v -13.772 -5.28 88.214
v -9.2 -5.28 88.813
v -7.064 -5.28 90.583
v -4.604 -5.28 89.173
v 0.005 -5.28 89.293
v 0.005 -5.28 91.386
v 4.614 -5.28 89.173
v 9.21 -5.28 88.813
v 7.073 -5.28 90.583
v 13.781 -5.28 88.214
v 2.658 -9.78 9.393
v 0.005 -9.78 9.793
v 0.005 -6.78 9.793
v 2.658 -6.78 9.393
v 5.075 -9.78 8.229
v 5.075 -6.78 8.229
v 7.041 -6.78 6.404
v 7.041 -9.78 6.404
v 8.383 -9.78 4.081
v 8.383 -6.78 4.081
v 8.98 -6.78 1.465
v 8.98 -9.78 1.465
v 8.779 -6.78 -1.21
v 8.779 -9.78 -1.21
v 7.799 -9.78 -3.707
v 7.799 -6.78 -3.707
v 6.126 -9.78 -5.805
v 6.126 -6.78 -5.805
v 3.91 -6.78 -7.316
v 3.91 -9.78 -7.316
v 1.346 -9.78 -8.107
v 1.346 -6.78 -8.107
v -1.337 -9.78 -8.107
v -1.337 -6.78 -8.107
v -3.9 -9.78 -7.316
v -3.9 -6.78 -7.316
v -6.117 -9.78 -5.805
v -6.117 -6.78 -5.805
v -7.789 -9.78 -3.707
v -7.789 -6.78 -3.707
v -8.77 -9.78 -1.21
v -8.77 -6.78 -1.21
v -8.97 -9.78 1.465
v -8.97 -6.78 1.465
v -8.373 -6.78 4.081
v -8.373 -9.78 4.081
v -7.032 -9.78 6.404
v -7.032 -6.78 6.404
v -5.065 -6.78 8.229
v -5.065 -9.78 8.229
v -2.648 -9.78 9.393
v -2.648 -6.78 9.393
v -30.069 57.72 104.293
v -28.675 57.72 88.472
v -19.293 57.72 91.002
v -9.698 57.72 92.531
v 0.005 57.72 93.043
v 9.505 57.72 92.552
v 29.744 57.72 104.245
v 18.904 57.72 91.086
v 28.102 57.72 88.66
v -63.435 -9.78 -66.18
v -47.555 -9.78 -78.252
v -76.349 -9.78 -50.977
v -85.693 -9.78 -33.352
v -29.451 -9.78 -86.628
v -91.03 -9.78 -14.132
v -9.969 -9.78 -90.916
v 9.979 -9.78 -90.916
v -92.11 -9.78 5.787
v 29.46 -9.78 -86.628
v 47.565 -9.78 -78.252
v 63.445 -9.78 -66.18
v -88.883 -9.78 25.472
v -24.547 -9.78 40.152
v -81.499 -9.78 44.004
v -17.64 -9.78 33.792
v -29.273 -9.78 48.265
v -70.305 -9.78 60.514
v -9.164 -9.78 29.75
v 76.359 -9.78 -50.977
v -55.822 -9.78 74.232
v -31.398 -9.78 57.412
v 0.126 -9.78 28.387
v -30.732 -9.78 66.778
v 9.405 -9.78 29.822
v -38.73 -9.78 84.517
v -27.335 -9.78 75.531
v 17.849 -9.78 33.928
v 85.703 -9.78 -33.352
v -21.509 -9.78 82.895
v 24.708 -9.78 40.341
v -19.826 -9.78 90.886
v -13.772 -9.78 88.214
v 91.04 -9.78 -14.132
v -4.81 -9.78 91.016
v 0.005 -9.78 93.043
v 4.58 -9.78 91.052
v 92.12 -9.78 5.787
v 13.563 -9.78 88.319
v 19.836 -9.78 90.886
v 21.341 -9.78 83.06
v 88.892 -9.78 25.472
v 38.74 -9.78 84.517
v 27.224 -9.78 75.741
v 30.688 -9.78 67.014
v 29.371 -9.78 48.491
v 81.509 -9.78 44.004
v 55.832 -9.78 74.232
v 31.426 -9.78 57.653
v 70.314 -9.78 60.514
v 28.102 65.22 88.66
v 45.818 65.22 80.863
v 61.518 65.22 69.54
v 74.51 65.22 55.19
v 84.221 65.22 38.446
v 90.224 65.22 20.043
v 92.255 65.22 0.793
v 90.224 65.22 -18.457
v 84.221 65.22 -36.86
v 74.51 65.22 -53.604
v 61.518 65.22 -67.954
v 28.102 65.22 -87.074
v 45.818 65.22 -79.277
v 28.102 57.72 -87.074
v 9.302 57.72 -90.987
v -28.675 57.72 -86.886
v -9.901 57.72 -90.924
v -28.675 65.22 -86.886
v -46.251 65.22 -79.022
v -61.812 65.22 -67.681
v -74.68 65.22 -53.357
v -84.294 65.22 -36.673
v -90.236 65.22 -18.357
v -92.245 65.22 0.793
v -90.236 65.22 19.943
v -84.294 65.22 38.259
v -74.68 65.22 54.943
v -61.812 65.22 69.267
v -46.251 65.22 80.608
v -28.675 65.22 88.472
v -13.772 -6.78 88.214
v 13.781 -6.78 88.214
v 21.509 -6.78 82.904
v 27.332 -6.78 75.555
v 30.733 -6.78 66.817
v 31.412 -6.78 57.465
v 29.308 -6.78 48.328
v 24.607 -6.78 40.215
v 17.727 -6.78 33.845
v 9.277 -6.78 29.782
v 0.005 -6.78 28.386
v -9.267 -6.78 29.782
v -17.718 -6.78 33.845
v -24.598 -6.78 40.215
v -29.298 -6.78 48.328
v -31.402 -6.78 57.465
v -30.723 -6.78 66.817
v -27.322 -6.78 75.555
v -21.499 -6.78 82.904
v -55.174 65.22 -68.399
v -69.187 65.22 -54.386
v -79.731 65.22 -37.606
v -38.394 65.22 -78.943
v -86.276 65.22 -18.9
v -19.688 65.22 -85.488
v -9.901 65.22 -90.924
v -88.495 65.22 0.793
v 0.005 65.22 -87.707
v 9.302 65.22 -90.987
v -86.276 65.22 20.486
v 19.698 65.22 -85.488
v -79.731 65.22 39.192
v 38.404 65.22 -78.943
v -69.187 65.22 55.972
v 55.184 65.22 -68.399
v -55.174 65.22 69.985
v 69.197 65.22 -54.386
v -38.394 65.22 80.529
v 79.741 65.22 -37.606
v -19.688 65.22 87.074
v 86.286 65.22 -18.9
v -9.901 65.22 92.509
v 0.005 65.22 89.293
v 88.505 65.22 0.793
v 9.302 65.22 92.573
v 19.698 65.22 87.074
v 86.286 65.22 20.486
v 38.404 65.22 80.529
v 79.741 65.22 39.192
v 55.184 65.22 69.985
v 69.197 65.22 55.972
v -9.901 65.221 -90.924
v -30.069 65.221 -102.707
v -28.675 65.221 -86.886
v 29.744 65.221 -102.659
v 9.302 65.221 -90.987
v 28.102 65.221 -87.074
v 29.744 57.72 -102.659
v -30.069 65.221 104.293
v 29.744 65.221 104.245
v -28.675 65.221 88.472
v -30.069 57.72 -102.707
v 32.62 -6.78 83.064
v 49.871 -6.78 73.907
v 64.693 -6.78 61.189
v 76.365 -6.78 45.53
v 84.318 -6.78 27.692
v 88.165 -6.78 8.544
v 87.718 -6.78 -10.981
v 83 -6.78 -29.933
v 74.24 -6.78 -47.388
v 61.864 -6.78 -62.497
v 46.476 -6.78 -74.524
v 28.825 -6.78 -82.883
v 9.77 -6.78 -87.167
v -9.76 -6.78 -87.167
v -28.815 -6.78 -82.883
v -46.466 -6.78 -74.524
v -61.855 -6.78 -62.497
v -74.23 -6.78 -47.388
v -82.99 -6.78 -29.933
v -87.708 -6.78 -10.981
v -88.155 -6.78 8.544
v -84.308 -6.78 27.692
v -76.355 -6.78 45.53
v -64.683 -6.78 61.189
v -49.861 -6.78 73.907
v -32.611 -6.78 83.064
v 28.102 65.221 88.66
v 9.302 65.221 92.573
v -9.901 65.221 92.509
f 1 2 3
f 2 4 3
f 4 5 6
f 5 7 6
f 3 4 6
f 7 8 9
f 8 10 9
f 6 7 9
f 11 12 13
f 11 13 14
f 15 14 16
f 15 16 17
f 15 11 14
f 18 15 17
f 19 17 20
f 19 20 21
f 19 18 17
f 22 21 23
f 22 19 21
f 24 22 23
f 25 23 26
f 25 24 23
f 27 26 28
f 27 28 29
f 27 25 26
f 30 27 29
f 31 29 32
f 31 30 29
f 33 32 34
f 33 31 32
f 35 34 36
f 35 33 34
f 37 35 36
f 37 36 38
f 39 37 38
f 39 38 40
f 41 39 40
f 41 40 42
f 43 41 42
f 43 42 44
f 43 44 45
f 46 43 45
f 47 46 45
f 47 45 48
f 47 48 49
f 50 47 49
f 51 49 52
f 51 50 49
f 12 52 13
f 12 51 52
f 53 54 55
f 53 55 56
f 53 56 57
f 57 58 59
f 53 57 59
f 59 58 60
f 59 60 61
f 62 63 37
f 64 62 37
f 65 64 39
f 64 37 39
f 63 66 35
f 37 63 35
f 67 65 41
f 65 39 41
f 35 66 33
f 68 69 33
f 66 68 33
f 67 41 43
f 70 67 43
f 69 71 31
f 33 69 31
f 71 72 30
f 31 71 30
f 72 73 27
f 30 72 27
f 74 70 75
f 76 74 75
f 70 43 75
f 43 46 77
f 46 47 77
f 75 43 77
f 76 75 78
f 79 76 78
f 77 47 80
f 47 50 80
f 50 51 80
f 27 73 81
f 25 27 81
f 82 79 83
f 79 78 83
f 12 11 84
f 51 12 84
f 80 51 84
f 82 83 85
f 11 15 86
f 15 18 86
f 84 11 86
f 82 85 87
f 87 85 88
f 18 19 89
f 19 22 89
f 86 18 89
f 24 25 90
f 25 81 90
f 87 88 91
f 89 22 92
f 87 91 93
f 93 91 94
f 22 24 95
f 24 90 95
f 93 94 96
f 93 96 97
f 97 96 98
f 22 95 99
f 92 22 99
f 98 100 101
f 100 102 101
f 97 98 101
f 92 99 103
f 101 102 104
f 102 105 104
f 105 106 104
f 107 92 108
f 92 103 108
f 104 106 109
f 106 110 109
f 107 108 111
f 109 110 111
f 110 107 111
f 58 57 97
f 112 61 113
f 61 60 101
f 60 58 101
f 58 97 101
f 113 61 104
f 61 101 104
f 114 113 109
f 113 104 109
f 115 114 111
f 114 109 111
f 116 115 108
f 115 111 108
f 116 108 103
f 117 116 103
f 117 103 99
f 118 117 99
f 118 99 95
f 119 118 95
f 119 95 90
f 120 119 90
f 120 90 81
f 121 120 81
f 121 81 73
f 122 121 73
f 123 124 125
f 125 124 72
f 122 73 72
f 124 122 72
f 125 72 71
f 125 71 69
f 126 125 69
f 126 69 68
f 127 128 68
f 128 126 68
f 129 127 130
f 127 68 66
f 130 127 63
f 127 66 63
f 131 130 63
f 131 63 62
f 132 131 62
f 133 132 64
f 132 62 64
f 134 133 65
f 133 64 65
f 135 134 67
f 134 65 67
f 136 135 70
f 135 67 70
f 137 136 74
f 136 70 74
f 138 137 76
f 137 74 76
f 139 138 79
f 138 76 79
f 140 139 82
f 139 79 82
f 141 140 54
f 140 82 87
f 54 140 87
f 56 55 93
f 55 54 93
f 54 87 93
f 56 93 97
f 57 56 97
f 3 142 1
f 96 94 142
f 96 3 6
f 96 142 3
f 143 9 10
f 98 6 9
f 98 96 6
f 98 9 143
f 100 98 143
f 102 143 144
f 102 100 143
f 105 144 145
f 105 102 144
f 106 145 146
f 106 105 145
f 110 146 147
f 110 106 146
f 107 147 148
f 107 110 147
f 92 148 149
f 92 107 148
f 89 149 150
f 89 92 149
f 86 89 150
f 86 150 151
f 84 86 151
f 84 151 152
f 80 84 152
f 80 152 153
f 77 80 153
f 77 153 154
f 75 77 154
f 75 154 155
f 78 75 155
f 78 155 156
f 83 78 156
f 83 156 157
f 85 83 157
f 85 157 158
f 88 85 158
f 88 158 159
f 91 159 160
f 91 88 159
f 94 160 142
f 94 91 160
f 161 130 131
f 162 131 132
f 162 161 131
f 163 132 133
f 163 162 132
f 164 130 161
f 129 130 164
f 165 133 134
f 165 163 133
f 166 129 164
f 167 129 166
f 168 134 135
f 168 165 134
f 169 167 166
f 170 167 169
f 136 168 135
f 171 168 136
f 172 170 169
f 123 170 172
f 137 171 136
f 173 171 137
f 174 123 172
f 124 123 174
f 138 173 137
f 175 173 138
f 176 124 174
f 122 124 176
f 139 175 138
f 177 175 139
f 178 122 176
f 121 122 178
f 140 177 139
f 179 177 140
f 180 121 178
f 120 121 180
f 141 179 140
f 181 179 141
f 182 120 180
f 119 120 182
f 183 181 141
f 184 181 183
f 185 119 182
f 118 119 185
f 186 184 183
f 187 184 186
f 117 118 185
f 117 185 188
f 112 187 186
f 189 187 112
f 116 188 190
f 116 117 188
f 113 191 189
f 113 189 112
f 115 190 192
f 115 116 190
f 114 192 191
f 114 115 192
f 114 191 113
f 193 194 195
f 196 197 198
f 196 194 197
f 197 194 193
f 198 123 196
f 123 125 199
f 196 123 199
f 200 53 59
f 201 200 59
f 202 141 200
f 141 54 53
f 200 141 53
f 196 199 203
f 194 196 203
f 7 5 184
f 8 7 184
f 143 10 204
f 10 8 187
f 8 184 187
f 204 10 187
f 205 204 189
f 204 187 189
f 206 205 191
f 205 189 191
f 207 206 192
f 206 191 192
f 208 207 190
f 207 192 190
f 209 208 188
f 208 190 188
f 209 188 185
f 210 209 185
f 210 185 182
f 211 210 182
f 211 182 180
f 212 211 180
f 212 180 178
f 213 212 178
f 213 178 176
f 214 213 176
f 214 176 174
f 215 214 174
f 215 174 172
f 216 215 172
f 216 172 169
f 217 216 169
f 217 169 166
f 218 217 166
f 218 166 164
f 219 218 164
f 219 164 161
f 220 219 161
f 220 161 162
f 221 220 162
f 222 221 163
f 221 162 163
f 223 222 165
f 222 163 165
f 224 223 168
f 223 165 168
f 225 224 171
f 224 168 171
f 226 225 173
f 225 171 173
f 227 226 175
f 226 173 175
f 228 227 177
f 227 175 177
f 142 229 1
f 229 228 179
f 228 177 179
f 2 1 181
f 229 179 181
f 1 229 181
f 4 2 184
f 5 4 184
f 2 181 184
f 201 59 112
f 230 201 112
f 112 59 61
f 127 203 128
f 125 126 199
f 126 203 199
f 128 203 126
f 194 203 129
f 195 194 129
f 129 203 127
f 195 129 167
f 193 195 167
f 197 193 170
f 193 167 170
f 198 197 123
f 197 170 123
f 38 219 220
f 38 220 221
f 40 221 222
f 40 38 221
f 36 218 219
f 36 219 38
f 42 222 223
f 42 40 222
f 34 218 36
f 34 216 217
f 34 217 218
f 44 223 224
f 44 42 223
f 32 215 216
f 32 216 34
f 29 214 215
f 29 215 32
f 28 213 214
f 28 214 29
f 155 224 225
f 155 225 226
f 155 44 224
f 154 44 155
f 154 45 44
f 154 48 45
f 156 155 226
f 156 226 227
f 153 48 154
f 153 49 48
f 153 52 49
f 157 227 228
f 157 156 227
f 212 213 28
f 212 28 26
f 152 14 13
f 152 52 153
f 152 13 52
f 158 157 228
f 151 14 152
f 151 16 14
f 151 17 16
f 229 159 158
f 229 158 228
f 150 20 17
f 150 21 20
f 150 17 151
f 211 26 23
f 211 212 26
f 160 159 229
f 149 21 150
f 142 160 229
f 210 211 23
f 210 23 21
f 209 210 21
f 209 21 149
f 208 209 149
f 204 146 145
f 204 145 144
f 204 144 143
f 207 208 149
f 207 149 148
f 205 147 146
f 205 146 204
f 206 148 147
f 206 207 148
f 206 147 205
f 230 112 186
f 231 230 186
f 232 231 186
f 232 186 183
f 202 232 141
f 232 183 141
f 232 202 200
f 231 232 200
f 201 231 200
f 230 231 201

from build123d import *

# Parameters (mm, degrees)
SKETCH2_R           = 61.5
BOSS_EXTRUDE1_DEPTH = 50
SKETCH6_R           = 59
CUT_EXTRUDE1_DEPTH  = 48
SKETCH7_R           = 6
CUT_EXTRUDE4_DEPTH  = 2
SKETCH9_R           = 21
CUT_EXTRUDE5_DEPTH  = 3
BOSS_EXTRUDE2_START = -5
BOSS_EXTRUDE2_DEPTH = 5.0001
SCALE2_SCALE        = 1.5


# Read off the part's stored shape, not the designer's step: Boss-Extrude2
with BuildPart() as part:
    # Sketch2 → Boss-Extrude1 (new body)
    with BuildSketch(Plane(origin=(0, 0, 0), x_dir=(1, 0, 0), z_dir=(0, 1, 0))):
        with Locations(Location((0, 0, 0), (0, 0, 270))):
            Circle(SKETCH2_R)
    extrude(amount=BOSS_EXTRUDE1_DEPTH)

    # Sketch6 → Cut-Extrude1 (cut)
    with BuildSketch(Plane(origin=(0, 50, 0), x_dir=(1, 0, 0), z_dir=(0, 1, 0))):
        with Locations(Location((0, 0, 0), (0, 0, 270))):
            Circle(SKETCH6_R)
    extrude(amount=-CUT_EXTRUDE1_DEPTH, mode=Mode.SUBTRACT)

    # Sketch7 → Cut-Extrude4 (cut)
    with BuildSketch(Plane(origin=(0, 0, 0), x_dir=(1, 0, 0), z_dir=(0, 1, 0))):
        with Locations(Location((0, 0, 0), (0, 0, 270))):
            Circle(SKETCH7_R)
    extrude(amount=CUT_EXTRUDE4_DEPTH, mode=Mode.SUBTRACT)

    # Sketch9 → Cut-Extrude5 (cut)
    with BuildSketch(Plane(origin=(0, 0, 0), x_dir=(1, 0, 0), z_dir=(0, 1, 0))):
        with Locations(Location((0, -39.395608547, 0), (0, 0, 244.065435775))):
            Circle(SKETCH9_R)
    extrude(amount=CUT_EXTRUDE5_DEPTH, mode=Mode.SUBTRACT)

    # Boss-Extrude2 outline → Boss-Extrude2 (add)
    with BuildSketch(Plane(origin=(0, 50, 0), x_dir=(1, 0, 0), z_dir=(0, 1, 0)).offset(BOSS_EXTRUDE2_START)):
        with BuildLine():
            ThreePointArc((18.731112888, -58.578113745), (-0.20418242, -61.499661052), (-19.119661096, -58.452446994))
            Line((-19.119661096, -58.452446994), (-20.049464932, -68.999980107))
            Line((-20.049464932, -68.999980107), (19.825959412, -68.968020016))
            Line((19.825959412, -68.968020016), (18.731112888, -58.578113745))
        make_face()
        with BuildLine():
            Line((-20.049464932, 68.999980107), (-19.119661096, 58.452446994))
            ThreePointArc((-19.119661096, 58.452446994), (-0.20418242, 61.499661052), (18.731112888, 58.578113745))
            Line((18.731112888, 58.578113745), (19.825959412, 68.968020016))
            Line((19.825959412, 68.968020016), (-20.049464932, 68.999980107))
        make_face()
    extrude(amount=BOSS_EXTRUDE2_DEPTH)


with BuildPart() as part_1:
    # Scale2: scaled about (-0.009677872, 19.559028085, -1.585736767)
    add(part.part.scale(SCALE2_SCALE).moved(Location((0.004838936, -9.779514043, 0.792868383))))


solid = part_1.part
